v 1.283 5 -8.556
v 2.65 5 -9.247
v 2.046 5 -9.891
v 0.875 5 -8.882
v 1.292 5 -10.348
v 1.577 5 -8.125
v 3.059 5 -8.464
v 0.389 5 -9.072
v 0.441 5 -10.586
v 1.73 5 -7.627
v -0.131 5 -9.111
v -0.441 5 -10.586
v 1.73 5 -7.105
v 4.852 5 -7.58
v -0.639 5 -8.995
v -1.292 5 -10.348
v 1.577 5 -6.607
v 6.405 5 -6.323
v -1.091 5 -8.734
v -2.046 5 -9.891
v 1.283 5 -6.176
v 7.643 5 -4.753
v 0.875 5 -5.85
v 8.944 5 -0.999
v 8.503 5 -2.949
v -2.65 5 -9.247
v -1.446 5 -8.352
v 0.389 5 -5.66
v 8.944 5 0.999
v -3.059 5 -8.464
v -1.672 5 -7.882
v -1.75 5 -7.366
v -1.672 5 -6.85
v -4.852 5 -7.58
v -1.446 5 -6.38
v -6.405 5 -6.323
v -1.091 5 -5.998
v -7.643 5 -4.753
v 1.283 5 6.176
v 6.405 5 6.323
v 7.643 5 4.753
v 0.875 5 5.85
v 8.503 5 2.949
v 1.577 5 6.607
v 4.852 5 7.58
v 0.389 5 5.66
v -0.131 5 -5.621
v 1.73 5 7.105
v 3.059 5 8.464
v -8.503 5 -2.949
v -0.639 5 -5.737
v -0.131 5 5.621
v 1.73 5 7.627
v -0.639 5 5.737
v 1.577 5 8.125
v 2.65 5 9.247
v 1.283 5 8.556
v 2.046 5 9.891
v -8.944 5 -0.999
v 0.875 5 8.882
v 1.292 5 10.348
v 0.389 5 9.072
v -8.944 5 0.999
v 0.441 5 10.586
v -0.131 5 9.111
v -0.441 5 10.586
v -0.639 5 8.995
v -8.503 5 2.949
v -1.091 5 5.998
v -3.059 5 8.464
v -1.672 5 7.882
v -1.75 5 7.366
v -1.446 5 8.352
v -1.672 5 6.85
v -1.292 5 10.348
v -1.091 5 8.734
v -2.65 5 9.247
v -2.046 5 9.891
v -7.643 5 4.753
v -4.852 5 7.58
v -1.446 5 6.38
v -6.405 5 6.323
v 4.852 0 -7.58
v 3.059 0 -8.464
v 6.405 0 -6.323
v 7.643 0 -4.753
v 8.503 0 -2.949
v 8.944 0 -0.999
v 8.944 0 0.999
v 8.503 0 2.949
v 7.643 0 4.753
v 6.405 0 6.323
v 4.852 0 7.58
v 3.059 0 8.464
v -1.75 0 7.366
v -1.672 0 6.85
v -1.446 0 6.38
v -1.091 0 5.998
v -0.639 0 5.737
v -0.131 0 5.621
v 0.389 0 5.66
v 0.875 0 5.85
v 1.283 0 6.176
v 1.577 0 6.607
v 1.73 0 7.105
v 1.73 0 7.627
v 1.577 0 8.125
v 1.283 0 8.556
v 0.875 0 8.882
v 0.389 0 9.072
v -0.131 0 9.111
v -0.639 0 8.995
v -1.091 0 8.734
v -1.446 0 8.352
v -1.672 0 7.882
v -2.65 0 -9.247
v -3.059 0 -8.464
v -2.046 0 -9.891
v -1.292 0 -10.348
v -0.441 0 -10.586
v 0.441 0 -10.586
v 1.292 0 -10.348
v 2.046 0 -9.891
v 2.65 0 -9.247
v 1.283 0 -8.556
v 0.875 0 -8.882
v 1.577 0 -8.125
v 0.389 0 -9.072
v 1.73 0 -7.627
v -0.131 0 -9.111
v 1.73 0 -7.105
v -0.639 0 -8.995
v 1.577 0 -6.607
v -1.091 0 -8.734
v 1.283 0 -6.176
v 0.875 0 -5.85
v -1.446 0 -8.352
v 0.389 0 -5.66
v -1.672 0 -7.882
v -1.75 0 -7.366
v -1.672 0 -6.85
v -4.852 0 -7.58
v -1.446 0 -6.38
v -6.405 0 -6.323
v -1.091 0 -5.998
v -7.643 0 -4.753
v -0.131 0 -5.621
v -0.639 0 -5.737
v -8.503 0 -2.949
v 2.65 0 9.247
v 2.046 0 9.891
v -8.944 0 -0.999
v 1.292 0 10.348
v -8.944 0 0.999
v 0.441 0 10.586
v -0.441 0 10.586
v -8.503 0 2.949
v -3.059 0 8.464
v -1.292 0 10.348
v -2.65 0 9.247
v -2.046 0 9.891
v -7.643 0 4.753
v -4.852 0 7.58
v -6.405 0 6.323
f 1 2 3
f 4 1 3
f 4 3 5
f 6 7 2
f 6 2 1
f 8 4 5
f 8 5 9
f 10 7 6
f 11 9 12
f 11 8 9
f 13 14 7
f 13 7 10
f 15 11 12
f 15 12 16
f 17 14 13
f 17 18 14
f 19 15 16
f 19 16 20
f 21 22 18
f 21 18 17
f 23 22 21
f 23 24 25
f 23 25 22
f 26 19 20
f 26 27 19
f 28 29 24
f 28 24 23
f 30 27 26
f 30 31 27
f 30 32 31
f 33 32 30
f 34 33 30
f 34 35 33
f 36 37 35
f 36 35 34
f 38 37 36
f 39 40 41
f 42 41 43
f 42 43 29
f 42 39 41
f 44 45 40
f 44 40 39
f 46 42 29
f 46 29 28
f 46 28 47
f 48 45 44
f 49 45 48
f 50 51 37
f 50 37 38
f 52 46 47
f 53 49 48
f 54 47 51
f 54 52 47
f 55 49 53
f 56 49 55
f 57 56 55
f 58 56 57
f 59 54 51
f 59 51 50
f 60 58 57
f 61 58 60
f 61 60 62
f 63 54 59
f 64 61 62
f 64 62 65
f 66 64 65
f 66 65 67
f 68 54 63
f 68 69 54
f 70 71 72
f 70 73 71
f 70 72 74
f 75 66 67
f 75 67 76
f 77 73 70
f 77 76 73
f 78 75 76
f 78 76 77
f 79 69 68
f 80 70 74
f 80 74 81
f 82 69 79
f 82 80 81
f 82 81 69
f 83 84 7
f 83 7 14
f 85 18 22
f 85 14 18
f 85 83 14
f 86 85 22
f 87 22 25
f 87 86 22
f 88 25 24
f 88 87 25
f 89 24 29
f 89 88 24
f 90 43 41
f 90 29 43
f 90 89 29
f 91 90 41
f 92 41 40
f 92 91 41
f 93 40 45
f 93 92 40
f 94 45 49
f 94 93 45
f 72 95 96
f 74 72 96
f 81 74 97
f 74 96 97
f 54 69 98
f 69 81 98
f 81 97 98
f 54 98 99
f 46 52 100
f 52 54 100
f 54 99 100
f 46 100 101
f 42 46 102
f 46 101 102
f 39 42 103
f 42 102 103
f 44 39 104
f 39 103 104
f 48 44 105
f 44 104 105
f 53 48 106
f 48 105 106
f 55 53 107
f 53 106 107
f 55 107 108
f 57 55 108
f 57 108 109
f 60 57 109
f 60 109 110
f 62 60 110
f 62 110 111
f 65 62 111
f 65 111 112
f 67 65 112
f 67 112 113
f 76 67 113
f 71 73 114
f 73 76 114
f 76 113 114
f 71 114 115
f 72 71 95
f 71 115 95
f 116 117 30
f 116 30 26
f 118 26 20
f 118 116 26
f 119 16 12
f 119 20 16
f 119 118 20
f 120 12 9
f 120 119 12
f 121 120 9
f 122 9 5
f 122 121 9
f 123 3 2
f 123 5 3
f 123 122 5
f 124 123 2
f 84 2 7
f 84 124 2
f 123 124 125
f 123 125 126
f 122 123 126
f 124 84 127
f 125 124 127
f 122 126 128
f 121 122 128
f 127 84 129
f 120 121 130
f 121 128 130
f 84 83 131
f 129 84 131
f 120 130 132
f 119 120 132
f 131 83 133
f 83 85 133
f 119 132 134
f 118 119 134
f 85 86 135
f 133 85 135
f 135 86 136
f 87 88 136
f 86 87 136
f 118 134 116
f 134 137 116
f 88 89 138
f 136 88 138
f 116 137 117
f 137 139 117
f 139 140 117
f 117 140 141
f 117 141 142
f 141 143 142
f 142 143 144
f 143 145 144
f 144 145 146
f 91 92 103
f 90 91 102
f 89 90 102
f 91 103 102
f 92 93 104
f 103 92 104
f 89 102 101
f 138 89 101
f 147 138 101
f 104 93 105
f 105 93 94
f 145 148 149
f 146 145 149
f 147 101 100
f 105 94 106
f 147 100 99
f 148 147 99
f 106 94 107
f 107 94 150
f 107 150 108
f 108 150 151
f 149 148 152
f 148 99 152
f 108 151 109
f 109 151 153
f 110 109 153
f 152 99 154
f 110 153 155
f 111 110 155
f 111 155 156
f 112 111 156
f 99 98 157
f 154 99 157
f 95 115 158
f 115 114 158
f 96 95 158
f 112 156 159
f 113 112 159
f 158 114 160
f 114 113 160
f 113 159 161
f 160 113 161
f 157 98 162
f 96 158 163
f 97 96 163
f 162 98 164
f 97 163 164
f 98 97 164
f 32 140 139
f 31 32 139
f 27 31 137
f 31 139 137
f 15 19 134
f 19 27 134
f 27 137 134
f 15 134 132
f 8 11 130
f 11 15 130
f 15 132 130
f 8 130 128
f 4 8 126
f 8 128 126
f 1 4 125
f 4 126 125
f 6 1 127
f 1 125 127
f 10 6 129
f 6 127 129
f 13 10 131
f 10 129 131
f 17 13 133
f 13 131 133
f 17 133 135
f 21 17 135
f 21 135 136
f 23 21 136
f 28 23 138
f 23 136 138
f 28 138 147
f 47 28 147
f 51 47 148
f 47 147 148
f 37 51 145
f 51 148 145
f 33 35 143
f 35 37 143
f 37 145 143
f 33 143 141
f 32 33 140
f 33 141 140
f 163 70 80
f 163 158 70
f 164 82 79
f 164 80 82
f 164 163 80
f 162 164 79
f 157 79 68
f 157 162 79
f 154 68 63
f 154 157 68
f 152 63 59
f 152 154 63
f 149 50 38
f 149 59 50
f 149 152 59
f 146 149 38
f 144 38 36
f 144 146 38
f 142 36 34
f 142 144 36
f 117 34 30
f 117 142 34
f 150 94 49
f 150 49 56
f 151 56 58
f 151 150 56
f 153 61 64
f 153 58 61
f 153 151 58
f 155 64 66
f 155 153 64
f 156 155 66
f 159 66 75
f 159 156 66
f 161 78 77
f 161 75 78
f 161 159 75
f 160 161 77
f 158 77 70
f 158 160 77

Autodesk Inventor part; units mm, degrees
ref_plane "YZ Plane" through (0, 0, 0) normal (1, 0, 0) x (0, 1, 0)
ref_plane "XZ Plane" through (0, 0, 0) normal (0, 1, 0) x (-1, 0, 0)
ref_plane "XY Plane" through (0, 0, 0) normal (0, 0, 1) x (1, 0, 0)
sketch "Sketch1" plane through (0, 0, 0) normal (0, 1, 0) x (-1, 0, 0)
  circle A0 centre (0, 7.366) radius 1.75
  circle A1 centre (0, -7.366) radius 1.75
  arc A2 (3.0588, -8.4643) -> (3.0588, 8.4643) centre (0, 0) ccw
  arc A3 (-3.0588, 8.4643) -> (-3.0588, -8.4643) centre (0, 0) ccw
  arc A4 (3.0588, 8.4643) -> (-3.0588, 8.4643) centre (0, 7.366) ccw
  arc A5 (-3.0588, -8.4643) -> (3.0588, -8.4643) centre (0, -7.366) ccw
  point P0 (9, 0)
extrude "Extrusion1" add sketch "Sketch1" along normal blind 5
properties part number "Ball Caster Spacer"
